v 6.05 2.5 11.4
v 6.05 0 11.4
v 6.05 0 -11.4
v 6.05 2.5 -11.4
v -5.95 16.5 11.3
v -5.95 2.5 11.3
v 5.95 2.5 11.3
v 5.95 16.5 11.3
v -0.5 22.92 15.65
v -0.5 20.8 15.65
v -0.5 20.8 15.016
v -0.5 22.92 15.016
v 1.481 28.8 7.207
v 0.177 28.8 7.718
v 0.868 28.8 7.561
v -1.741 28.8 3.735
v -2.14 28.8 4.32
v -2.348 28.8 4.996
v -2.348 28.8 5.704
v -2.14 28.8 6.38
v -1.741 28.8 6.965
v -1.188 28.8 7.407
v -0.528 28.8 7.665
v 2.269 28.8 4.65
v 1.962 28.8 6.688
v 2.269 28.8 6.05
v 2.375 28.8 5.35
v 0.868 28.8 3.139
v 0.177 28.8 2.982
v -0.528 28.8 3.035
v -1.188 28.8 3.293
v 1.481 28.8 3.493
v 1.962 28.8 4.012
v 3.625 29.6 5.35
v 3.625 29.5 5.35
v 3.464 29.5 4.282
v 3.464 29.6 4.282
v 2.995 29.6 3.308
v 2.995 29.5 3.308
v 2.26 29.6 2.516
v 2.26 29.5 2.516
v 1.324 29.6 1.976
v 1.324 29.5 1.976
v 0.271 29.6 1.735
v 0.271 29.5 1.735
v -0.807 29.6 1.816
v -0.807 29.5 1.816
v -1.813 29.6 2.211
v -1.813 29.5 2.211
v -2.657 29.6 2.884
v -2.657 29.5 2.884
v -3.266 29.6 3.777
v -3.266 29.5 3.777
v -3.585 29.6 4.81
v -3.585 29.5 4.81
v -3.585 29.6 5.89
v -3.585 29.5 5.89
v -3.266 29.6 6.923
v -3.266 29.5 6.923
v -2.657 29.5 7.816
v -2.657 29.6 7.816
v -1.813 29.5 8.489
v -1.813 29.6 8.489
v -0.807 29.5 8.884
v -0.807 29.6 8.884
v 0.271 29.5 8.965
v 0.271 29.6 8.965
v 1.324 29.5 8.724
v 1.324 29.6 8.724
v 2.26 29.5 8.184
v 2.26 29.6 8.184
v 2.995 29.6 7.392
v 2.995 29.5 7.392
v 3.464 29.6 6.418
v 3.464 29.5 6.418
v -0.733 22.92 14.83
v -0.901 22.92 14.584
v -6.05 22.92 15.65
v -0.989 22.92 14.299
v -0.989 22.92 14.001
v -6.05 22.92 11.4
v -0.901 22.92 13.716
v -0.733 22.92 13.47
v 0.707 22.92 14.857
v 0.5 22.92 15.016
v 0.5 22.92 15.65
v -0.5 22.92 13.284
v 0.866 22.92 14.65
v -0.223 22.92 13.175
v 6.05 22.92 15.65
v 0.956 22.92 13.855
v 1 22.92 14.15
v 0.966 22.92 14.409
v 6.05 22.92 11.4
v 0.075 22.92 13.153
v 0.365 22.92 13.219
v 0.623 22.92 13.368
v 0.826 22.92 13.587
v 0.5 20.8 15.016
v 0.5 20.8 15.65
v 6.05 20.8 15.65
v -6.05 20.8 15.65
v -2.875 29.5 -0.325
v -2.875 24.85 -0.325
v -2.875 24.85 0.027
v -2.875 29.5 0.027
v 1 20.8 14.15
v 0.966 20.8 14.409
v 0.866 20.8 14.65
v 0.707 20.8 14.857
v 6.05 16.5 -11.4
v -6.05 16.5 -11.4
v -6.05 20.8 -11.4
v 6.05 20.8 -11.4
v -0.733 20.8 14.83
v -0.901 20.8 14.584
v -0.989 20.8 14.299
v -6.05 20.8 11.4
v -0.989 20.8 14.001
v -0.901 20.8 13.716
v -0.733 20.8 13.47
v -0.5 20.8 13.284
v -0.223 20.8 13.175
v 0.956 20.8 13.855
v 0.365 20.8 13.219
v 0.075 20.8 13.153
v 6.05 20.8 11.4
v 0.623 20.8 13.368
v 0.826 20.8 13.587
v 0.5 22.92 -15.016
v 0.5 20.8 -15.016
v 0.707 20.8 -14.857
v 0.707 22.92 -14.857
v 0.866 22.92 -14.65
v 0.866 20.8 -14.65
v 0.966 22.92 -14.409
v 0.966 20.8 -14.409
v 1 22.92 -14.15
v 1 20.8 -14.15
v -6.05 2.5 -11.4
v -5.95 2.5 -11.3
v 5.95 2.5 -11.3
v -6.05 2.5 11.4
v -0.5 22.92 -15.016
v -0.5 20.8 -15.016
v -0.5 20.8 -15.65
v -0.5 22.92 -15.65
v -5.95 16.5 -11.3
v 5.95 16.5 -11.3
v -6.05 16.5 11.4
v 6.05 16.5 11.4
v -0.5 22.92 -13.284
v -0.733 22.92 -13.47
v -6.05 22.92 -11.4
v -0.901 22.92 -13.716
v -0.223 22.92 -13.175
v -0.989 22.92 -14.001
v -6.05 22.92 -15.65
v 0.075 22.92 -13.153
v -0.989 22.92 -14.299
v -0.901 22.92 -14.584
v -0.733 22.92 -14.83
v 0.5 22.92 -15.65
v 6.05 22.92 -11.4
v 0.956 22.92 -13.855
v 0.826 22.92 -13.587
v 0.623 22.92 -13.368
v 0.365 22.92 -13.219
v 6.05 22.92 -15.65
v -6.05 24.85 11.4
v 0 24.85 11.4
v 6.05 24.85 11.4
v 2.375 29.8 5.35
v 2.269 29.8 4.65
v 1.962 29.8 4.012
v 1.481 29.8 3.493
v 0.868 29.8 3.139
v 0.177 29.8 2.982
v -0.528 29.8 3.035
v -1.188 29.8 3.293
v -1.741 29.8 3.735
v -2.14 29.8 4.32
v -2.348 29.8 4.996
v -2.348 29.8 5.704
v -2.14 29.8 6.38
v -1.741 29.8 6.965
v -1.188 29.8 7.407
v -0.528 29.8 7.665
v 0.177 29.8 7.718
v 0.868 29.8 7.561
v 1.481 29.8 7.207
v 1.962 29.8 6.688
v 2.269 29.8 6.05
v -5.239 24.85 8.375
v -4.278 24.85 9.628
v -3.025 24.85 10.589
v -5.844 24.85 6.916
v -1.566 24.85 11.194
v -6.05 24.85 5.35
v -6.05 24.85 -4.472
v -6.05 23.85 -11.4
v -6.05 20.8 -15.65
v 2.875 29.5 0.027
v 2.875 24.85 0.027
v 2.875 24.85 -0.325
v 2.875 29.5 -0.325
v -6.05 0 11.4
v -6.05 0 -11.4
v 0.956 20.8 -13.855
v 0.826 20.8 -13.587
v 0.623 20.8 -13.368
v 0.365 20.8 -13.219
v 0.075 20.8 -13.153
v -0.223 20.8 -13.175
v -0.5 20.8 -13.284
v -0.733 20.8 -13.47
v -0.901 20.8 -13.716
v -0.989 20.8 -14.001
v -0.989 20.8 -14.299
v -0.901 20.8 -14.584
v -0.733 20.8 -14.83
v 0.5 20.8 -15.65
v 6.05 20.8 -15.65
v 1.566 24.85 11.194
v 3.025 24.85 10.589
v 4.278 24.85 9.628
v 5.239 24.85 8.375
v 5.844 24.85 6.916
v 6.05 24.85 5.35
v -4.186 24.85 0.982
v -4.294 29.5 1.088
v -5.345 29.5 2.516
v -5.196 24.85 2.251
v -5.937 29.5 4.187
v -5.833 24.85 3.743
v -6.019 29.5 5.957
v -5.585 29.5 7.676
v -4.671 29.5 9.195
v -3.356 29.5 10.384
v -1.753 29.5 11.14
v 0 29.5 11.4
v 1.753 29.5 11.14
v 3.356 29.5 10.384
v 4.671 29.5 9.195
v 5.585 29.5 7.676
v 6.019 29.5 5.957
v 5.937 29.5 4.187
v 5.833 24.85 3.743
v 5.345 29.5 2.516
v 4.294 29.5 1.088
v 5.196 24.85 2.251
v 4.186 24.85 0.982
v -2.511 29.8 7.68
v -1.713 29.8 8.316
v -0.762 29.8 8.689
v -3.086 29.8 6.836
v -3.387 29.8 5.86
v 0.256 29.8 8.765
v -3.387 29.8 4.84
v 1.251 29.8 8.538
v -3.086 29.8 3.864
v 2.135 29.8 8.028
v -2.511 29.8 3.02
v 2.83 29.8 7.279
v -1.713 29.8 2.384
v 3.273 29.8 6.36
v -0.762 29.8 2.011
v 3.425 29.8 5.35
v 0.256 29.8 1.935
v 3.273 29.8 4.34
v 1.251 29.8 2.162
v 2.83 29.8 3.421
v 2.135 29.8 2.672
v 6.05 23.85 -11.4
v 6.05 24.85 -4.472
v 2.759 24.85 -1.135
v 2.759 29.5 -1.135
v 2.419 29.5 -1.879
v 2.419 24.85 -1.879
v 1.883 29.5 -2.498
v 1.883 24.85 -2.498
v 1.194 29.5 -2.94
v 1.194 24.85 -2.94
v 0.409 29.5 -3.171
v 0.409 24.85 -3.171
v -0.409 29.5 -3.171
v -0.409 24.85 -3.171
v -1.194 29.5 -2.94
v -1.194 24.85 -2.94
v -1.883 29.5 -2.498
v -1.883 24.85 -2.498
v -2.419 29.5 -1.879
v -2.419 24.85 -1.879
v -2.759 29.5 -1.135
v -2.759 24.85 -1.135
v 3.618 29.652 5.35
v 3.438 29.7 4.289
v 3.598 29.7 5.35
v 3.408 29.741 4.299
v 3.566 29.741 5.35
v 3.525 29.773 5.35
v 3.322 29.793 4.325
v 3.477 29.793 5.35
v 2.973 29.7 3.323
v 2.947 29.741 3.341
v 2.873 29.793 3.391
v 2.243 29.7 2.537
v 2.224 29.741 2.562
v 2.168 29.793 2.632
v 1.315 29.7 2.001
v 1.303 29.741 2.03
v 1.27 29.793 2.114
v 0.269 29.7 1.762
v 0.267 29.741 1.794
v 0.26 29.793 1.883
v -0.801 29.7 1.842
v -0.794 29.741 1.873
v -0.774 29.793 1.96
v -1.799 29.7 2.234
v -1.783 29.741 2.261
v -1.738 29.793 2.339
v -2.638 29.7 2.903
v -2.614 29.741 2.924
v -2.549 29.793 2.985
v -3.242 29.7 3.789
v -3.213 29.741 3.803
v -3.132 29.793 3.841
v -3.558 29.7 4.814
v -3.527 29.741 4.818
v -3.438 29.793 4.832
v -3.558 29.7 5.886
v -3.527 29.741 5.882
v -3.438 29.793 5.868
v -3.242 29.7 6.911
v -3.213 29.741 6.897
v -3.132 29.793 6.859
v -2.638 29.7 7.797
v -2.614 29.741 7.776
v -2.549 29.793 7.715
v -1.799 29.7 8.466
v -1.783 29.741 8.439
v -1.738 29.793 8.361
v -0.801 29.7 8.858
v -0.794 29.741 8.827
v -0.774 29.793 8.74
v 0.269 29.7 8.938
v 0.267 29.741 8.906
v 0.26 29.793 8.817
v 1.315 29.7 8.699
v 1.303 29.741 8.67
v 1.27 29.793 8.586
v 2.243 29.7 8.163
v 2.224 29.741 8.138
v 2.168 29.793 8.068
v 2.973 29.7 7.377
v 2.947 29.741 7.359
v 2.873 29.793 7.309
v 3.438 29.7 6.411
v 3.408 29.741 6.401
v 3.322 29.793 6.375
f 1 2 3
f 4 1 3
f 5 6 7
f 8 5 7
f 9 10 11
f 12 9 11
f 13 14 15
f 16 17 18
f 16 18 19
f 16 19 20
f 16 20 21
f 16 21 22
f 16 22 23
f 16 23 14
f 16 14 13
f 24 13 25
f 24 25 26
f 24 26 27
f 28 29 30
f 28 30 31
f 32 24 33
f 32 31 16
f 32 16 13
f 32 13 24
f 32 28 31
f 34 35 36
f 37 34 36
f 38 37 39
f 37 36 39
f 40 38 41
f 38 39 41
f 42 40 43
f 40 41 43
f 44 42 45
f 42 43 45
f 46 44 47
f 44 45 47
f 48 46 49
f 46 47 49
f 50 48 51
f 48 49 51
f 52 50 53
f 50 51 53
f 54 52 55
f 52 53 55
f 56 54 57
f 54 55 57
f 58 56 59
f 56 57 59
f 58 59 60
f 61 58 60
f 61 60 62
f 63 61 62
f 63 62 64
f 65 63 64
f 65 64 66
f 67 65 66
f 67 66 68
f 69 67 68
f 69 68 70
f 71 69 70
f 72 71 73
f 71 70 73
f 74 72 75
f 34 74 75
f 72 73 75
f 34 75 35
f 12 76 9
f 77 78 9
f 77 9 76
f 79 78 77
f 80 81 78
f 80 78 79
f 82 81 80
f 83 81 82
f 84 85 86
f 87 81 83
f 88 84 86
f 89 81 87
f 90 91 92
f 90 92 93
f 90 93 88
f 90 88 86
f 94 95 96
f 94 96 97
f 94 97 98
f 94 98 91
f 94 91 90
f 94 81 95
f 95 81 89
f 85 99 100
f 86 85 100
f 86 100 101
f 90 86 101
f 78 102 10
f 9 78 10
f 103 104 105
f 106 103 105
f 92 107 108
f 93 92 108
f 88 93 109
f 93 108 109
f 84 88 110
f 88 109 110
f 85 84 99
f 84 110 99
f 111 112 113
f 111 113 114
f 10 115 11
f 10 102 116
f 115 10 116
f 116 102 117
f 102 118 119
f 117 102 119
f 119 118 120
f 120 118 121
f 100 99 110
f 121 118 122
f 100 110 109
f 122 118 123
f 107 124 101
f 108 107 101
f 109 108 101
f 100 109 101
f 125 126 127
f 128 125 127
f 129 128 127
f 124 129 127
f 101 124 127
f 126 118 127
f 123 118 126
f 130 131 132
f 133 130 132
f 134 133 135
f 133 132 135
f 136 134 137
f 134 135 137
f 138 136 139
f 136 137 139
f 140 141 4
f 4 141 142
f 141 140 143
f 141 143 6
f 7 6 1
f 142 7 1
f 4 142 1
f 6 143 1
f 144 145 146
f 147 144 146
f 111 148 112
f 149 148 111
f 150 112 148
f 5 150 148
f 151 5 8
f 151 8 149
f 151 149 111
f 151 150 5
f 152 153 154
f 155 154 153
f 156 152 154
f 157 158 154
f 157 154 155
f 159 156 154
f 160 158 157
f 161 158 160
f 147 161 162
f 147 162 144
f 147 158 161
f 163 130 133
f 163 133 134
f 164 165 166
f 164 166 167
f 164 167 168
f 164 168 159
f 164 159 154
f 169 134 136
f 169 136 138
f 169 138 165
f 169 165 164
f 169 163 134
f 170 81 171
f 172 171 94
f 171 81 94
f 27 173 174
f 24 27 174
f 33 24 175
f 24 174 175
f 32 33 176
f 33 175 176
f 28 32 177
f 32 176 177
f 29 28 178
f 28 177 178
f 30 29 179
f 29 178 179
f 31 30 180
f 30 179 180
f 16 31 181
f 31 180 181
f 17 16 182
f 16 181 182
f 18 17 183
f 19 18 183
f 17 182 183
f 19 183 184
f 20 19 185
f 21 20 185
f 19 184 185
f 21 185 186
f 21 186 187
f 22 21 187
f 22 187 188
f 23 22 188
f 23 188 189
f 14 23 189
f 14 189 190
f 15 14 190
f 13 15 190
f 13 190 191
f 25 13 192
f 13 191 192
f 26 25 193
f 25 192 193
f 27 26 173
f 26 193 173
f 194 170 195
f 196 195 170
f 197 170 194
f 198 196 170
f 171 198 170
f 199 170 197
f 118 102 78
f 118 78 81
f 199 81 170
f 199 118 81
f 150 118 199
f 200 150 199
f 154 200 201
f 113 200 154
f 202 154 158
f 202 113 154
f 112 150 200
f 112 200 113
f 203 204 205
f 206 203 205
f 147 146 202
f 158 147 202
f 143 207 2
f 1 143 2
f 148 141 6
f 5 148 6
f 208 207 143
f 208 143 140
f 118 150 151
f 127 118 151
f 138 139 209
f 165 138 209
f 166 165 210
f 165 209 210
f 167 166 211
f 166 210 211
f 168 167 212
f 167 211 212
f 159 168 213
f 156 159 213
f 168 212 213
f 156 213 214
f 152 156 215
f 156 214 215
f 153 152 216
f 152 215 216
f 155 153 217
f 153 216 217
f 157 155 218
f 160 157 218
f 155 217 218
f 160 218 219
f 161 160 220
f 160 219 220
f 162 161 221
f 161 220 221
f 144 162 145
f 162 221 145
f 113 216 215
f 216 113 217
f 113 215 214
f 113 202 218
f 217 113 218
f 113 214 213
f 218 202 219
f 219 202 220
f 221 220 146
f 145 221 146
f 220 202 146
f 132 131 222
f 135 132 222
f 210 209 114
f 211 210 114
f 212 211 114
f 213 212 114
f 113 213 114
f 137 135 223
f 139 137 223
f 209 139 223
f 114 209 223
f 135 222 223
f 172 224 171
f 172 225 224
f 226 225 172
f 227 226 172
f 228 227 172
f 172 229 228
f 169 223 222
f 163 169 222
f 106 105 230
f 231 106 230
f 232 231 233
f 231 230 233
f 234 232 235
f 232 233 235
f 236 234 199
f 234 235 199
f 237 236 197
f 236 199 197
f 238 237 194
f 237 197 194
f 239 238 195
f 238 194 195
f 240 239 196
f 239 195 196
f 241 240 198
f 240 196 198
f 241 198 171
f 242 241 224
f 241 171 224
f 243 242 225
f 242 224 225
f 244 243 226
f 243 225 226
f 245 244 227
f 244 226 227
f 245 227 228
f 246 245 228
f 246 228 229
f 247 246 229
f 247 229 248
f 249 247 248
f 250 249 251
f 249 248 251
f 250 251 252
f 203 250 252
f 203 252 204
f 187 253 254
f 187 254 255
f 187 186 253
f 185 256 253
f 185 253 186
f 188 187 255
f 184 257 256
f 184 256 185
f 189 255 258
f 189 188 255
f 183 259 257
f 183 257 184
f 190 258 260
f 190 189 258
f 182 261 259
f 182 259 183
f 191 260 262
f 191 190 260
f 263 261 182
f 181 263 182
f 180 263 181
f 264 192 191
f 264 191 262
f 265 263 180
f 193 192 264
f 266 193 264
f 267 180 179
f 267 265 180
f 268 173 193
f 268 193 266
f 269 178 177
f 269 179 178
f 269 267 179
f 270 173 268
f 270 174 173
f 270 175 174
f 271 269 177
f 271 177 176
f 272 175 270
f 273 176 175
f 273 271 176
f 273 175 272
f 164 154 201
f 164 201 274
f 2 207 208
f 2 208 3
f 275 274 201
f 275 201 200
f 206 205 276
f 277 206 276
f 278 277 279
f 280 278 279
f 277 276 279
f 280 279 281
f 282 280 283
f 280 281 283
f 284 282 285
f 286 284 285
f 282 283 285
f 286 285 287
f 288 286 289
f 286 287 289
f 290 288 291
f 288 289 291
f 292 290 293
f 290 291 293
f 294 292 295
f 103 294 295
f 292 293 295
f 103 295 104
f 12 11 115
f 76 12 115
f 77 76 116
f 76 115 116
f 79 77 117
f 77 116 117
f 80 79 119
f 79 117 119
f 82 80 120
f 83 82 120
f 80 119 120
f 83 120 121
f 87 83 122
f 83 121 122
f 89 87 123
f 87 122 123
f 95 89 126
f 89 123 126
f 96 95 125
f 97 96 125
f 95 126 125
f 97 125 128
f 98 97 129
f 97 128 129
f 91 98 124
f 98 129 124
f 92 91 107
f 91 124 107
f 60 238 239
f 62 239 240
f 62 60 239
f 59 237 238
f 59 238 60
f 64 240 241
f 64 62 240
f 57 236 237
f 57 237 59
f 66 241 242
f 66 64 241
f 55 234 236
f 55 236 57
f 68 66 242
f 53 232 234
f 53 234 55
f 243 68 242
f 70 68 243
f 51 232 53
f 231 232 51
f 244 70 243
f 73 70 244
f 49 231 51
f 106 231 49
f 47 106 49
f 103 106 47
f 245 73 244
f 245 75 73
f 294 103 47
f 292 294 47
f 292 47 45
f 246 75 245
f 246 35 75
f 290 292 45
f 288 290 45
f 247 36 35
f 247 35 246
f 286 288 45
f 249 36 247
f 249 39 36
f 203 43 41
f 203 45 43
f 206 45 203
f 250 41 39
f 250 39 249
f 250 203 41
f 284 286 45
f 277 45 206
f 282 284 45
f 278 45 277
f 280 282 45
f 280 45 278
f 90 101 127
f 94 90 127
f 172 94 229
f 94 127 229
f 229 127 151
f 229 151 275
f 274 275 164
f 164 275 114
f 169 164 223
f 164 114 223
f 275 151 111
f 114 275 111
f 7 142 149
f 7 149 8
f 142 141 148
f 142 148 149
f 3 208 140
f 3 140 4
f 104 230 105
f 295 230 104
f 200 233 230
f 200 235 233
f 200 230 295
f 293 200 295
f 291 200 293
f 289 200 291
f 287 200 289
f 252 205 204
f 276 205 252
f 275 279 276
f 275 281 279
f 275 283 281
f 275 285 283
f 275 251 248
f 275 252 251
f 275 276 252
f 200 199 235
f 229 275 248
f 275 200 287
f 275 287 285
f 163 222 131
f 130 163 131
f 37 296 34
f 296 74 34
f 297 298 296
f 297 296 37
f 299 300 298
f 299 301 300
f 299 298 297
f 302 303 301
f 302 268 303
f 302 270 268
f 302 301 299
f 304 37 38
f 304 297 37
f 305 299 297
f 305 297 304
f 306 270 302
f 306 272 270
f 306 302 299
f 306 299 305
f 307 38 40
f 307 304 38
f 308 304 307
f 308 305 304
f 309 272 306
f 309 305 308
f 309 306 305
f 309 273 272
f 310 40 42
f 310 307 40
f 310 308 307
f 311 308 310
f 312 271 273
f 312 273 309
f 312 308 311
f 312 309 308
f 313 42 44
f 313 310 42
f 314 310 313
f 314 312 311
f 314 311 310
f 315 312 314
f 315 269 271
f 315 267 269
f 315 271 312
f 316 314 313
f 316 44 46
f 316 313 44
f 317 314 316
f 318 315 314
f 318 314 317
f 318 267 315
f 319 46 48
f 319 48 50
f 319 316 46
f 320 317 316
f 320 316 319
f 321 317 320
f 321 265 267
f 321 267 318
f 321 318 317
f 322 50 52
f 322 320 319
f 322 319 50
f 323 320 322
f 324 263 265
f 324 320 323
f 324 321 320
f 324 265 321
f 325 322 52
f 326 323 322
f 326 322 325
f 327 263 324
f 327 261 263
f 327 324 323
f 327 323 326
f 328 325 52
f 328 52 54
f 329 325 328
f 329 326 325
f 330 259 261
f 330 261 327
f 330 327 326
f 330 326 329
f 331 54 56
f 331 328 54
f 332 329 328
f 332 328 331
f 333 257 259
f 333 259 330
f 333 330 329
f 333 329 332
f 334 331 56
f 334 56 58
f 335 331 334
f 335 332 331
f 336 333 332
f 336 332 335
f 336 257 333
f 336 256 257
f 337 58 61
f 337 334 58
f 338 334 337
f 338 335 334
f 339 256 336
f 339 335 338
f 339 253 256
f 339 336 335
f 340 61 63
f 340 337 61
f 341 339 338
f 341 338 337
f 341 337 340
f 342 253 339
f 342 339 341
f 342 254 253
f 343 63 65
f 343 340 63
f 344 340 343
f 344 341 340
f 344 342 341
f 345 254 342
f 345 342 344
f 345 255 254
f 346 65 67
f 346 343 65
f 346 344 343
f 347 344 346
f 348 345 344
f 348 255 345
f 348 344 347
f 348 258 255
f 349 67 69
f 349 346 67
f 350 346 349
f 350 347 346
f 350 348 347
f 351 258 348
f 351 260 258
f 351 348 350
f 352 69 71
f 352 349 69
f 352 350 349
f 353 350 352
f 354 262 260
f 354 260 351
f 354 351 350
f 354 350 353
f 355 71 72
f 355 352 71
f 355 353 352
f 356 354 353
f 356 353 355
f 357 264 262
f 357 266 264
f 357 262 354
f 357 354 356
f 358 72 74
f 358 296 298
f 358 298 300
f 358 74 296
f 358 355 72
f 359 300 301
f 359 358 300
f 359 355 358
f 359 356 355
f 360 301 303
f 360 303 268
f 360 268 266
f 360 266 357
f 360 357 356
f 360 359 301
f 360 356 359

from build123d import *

# Parameters (mm, degrees)
SKETCH1_W           = 12.1
SKETCH1_H           = 22.8
BOSS_EXTRUDE1_DEPTH = 24.85
SKETCH2_OUTSIDE_W   = 31.966
SKETCH2_OUTSIDE_H   = 34.016
CUT_EXTRUDE1_DEPTH  = 24.85
SKETCH3_R           = 2.875
SKETCH3_R_2         = 6.05
BOSS_EXTRUDE2_DEPTH = 4.65
BOSS_EXTRUDE3_START = 20.8
BOSS_EXTRUDE3_DEPTH = 2.12
CUT_EXTRUDE2_START  = -2.5
SKETCH6_W           = 12.1
SKETCH6_H           = 22.8
SKETCH6_W_2         = 11.9
SKETCH6_H_2         = 22.6
CUT_EXTRUDE2_DEPTH  = 14
SKETCH8_R           = 3.625
BOSS_EXTRUDE5_DEPTH = 0.3
FILLET1_R           = 0.2
SKETCH9_R           = 2.375
CUT_EXTRUDE3_DEPTH  = 1


with BuildPart() as part:
    # Sketch1 → Boss-Extrude1 (new body)
    with BuildSketch(Plane(origin=(0, 0, 0), x_dir=(1, 0, 0), z_dir=(0, 1, 0))):
        Rectangle(SKETCH1_W, SKETCH1_H)
    extrude(amount=BOSS_EXTRUDE1_DEPTH)

    # Sketch2 outside → Cut-Extrude1 (cut)
    with BuildSketch(Plane.ZY.offset(6.05)):
        with Locations((0, 12.425)):
            Rectangle(SKETCH2_OUTSIDE_W, SKETCH2_OUTSIDE_H)
        Polygon((-11.4, 23.85), (-4.47179677, 24.85), (11.4, 24.85), (11.4, 0), (-11.4, 0), align=None, mode=Mode.SUBTRACT)
    extrude(amount=-CUT_EXTRUDE1_DEPTH, mode=Mode.SUBTRACT)

    # Sketch3 → Boss-Extrude2 (add)
    with BuildSketch(Plane(origin=(0, 24.85, 0), x_dir=(1, 0, 0), z_dir=(0, 1, 0))):
        with Locations((0, 0.325)):
            Circle(SKETCH3_R)
        with Locations((0, -5.35)):
            Circle(SKETCH3_R_2)
        with BuildLine():
            Line((2.875, -0.026760855), (2.875, 0.325))
            ThreePointArc((2.875, 0.325), (2.869926129, 0.154269175), (2.854722425, -0.015859031))
            ThreePointArc((2.854722425, -0.015859031), (2.864866398, -0.021300297), (2.875, -0.026760855))
        make_face()
        with BuildLine():
            ThreePointArc((-2.854722425, -0.015859031), (-2.869926129, 0.154269175), (-2.875, 0.325))
            Line((-2.875, 0.325), (-2.875, -0.026760855))
            ThreePointArc((-2.875, -0.026760855), (-2.864866398, -0.021300297), (-2.854722425, -0.015859031))
        make_face()
    extrude(amount=BOSS_EXTRUDE2_DEPTH)

    # Sketch4 → Boss-Extrude3 (add)
    with BuildSketch(Plane(origin=(0, 0, 0), x_dir=(1, 0, 0), z_dir=(0, 1, 0)).offset(BOSS_EXTRUDE3_START)):
        with BuildLine():
            Line((-6.05, 15.65), (-6.05, 11.4))
            Line((-6.05, 11.4), (6.05, 11.4))
            Line((6.05, 11.4), (6.05, 15.65))
            Line((6.05, 15.65), (0.5, 15.65))
            Line((0.5, 15.65), (0.5, 15.016025404))
            ThreePointArc((0.5, 15.016025404), (0.866025404, 14.65), (1, 14.15))
            ThreePointArc((1, 14.15), (-0.5, 13.283974596), (-0.5, 15.016025404))
            Line((-0.5, 15.016025404), (-0.5, 15.65))
            Line((-0.5, 15.65), (-6.05, 15.65))
        make_face()
        with BuildLine():
            Line((6.05, -11.4), (-6.05, -11.4))
            Line((-6.05, -11.4), (-6.05, -15.65))
            Line((-6.05, -15.65), (-0.5, -15.65))
            Line((-0.5, -15.65), (-0.5, -15.016025404))
            ThreePointArc((-0.5, -15.016025404), (-0.5, -13.283974596), (1, -14.15))
            ThreePointArc((1, -14.15), (0.866025404, -14.65), (0.5, -15.016025404))
            Line((0.5, -15.016025404), (0.5, -15.65))
            Line((0.5, -15.65), (6.05, -15.65))
            Line((6.05, -15.65), (6.05, -11.4))
        make_face()
    extrude(amount=BOSS_EXTRUDE3_DEPTH)

    # Sketch6 → Cut-Extrude2 (cut)
    with BuildSketch(Plane.XZ.offset(CUT_EXTRUDE2_START)):
        Rectangle(SKETCH6_W, SKETCH6_H)
        Rectangle(SKETCH6_W_2, SKETCH6_H_2, mode=Mode.SUBTRACT)
    extrude(amount=-CUT_EXTRUDE2_DEPTH, mode=Mode.SUBTRACT)

    # Sketch8 → Boss-Extrude5 (add)
    with BuildSketch(Plane(origin=(0, 29.5, 0), x_dir=(1, 0, 0), z_dir=(0, 1, 0))):
        with Locations((0, -5.35)):
            Circle(SKETCH8_R)
    extrude(amount=BOSS_EXTRUDE5_DEPTH)

    # Fillet1
    fillet1_edges = [part.edges().sort_by_distance(p)[0] for p in [
        (-3.625, 29.8, 5.35),
    ]]
    fillet(fillet1_edges, radius=FILLET1_R)

    # Sketch9 → Cut-Extrude3 (cut)
    with BuildSketch(Plane(origin=(0, 29.8, 0), x_dir=(1, 0, 0), z_dir=(0, 1, 0))):
        with Locations((0, -5.35)):
            Circle(SKETCH9_R)
    extrude(amount=-CUT_EXTRUDE3_DEPTH, mode=Mode.SUBTRACT)


solid = part.part
